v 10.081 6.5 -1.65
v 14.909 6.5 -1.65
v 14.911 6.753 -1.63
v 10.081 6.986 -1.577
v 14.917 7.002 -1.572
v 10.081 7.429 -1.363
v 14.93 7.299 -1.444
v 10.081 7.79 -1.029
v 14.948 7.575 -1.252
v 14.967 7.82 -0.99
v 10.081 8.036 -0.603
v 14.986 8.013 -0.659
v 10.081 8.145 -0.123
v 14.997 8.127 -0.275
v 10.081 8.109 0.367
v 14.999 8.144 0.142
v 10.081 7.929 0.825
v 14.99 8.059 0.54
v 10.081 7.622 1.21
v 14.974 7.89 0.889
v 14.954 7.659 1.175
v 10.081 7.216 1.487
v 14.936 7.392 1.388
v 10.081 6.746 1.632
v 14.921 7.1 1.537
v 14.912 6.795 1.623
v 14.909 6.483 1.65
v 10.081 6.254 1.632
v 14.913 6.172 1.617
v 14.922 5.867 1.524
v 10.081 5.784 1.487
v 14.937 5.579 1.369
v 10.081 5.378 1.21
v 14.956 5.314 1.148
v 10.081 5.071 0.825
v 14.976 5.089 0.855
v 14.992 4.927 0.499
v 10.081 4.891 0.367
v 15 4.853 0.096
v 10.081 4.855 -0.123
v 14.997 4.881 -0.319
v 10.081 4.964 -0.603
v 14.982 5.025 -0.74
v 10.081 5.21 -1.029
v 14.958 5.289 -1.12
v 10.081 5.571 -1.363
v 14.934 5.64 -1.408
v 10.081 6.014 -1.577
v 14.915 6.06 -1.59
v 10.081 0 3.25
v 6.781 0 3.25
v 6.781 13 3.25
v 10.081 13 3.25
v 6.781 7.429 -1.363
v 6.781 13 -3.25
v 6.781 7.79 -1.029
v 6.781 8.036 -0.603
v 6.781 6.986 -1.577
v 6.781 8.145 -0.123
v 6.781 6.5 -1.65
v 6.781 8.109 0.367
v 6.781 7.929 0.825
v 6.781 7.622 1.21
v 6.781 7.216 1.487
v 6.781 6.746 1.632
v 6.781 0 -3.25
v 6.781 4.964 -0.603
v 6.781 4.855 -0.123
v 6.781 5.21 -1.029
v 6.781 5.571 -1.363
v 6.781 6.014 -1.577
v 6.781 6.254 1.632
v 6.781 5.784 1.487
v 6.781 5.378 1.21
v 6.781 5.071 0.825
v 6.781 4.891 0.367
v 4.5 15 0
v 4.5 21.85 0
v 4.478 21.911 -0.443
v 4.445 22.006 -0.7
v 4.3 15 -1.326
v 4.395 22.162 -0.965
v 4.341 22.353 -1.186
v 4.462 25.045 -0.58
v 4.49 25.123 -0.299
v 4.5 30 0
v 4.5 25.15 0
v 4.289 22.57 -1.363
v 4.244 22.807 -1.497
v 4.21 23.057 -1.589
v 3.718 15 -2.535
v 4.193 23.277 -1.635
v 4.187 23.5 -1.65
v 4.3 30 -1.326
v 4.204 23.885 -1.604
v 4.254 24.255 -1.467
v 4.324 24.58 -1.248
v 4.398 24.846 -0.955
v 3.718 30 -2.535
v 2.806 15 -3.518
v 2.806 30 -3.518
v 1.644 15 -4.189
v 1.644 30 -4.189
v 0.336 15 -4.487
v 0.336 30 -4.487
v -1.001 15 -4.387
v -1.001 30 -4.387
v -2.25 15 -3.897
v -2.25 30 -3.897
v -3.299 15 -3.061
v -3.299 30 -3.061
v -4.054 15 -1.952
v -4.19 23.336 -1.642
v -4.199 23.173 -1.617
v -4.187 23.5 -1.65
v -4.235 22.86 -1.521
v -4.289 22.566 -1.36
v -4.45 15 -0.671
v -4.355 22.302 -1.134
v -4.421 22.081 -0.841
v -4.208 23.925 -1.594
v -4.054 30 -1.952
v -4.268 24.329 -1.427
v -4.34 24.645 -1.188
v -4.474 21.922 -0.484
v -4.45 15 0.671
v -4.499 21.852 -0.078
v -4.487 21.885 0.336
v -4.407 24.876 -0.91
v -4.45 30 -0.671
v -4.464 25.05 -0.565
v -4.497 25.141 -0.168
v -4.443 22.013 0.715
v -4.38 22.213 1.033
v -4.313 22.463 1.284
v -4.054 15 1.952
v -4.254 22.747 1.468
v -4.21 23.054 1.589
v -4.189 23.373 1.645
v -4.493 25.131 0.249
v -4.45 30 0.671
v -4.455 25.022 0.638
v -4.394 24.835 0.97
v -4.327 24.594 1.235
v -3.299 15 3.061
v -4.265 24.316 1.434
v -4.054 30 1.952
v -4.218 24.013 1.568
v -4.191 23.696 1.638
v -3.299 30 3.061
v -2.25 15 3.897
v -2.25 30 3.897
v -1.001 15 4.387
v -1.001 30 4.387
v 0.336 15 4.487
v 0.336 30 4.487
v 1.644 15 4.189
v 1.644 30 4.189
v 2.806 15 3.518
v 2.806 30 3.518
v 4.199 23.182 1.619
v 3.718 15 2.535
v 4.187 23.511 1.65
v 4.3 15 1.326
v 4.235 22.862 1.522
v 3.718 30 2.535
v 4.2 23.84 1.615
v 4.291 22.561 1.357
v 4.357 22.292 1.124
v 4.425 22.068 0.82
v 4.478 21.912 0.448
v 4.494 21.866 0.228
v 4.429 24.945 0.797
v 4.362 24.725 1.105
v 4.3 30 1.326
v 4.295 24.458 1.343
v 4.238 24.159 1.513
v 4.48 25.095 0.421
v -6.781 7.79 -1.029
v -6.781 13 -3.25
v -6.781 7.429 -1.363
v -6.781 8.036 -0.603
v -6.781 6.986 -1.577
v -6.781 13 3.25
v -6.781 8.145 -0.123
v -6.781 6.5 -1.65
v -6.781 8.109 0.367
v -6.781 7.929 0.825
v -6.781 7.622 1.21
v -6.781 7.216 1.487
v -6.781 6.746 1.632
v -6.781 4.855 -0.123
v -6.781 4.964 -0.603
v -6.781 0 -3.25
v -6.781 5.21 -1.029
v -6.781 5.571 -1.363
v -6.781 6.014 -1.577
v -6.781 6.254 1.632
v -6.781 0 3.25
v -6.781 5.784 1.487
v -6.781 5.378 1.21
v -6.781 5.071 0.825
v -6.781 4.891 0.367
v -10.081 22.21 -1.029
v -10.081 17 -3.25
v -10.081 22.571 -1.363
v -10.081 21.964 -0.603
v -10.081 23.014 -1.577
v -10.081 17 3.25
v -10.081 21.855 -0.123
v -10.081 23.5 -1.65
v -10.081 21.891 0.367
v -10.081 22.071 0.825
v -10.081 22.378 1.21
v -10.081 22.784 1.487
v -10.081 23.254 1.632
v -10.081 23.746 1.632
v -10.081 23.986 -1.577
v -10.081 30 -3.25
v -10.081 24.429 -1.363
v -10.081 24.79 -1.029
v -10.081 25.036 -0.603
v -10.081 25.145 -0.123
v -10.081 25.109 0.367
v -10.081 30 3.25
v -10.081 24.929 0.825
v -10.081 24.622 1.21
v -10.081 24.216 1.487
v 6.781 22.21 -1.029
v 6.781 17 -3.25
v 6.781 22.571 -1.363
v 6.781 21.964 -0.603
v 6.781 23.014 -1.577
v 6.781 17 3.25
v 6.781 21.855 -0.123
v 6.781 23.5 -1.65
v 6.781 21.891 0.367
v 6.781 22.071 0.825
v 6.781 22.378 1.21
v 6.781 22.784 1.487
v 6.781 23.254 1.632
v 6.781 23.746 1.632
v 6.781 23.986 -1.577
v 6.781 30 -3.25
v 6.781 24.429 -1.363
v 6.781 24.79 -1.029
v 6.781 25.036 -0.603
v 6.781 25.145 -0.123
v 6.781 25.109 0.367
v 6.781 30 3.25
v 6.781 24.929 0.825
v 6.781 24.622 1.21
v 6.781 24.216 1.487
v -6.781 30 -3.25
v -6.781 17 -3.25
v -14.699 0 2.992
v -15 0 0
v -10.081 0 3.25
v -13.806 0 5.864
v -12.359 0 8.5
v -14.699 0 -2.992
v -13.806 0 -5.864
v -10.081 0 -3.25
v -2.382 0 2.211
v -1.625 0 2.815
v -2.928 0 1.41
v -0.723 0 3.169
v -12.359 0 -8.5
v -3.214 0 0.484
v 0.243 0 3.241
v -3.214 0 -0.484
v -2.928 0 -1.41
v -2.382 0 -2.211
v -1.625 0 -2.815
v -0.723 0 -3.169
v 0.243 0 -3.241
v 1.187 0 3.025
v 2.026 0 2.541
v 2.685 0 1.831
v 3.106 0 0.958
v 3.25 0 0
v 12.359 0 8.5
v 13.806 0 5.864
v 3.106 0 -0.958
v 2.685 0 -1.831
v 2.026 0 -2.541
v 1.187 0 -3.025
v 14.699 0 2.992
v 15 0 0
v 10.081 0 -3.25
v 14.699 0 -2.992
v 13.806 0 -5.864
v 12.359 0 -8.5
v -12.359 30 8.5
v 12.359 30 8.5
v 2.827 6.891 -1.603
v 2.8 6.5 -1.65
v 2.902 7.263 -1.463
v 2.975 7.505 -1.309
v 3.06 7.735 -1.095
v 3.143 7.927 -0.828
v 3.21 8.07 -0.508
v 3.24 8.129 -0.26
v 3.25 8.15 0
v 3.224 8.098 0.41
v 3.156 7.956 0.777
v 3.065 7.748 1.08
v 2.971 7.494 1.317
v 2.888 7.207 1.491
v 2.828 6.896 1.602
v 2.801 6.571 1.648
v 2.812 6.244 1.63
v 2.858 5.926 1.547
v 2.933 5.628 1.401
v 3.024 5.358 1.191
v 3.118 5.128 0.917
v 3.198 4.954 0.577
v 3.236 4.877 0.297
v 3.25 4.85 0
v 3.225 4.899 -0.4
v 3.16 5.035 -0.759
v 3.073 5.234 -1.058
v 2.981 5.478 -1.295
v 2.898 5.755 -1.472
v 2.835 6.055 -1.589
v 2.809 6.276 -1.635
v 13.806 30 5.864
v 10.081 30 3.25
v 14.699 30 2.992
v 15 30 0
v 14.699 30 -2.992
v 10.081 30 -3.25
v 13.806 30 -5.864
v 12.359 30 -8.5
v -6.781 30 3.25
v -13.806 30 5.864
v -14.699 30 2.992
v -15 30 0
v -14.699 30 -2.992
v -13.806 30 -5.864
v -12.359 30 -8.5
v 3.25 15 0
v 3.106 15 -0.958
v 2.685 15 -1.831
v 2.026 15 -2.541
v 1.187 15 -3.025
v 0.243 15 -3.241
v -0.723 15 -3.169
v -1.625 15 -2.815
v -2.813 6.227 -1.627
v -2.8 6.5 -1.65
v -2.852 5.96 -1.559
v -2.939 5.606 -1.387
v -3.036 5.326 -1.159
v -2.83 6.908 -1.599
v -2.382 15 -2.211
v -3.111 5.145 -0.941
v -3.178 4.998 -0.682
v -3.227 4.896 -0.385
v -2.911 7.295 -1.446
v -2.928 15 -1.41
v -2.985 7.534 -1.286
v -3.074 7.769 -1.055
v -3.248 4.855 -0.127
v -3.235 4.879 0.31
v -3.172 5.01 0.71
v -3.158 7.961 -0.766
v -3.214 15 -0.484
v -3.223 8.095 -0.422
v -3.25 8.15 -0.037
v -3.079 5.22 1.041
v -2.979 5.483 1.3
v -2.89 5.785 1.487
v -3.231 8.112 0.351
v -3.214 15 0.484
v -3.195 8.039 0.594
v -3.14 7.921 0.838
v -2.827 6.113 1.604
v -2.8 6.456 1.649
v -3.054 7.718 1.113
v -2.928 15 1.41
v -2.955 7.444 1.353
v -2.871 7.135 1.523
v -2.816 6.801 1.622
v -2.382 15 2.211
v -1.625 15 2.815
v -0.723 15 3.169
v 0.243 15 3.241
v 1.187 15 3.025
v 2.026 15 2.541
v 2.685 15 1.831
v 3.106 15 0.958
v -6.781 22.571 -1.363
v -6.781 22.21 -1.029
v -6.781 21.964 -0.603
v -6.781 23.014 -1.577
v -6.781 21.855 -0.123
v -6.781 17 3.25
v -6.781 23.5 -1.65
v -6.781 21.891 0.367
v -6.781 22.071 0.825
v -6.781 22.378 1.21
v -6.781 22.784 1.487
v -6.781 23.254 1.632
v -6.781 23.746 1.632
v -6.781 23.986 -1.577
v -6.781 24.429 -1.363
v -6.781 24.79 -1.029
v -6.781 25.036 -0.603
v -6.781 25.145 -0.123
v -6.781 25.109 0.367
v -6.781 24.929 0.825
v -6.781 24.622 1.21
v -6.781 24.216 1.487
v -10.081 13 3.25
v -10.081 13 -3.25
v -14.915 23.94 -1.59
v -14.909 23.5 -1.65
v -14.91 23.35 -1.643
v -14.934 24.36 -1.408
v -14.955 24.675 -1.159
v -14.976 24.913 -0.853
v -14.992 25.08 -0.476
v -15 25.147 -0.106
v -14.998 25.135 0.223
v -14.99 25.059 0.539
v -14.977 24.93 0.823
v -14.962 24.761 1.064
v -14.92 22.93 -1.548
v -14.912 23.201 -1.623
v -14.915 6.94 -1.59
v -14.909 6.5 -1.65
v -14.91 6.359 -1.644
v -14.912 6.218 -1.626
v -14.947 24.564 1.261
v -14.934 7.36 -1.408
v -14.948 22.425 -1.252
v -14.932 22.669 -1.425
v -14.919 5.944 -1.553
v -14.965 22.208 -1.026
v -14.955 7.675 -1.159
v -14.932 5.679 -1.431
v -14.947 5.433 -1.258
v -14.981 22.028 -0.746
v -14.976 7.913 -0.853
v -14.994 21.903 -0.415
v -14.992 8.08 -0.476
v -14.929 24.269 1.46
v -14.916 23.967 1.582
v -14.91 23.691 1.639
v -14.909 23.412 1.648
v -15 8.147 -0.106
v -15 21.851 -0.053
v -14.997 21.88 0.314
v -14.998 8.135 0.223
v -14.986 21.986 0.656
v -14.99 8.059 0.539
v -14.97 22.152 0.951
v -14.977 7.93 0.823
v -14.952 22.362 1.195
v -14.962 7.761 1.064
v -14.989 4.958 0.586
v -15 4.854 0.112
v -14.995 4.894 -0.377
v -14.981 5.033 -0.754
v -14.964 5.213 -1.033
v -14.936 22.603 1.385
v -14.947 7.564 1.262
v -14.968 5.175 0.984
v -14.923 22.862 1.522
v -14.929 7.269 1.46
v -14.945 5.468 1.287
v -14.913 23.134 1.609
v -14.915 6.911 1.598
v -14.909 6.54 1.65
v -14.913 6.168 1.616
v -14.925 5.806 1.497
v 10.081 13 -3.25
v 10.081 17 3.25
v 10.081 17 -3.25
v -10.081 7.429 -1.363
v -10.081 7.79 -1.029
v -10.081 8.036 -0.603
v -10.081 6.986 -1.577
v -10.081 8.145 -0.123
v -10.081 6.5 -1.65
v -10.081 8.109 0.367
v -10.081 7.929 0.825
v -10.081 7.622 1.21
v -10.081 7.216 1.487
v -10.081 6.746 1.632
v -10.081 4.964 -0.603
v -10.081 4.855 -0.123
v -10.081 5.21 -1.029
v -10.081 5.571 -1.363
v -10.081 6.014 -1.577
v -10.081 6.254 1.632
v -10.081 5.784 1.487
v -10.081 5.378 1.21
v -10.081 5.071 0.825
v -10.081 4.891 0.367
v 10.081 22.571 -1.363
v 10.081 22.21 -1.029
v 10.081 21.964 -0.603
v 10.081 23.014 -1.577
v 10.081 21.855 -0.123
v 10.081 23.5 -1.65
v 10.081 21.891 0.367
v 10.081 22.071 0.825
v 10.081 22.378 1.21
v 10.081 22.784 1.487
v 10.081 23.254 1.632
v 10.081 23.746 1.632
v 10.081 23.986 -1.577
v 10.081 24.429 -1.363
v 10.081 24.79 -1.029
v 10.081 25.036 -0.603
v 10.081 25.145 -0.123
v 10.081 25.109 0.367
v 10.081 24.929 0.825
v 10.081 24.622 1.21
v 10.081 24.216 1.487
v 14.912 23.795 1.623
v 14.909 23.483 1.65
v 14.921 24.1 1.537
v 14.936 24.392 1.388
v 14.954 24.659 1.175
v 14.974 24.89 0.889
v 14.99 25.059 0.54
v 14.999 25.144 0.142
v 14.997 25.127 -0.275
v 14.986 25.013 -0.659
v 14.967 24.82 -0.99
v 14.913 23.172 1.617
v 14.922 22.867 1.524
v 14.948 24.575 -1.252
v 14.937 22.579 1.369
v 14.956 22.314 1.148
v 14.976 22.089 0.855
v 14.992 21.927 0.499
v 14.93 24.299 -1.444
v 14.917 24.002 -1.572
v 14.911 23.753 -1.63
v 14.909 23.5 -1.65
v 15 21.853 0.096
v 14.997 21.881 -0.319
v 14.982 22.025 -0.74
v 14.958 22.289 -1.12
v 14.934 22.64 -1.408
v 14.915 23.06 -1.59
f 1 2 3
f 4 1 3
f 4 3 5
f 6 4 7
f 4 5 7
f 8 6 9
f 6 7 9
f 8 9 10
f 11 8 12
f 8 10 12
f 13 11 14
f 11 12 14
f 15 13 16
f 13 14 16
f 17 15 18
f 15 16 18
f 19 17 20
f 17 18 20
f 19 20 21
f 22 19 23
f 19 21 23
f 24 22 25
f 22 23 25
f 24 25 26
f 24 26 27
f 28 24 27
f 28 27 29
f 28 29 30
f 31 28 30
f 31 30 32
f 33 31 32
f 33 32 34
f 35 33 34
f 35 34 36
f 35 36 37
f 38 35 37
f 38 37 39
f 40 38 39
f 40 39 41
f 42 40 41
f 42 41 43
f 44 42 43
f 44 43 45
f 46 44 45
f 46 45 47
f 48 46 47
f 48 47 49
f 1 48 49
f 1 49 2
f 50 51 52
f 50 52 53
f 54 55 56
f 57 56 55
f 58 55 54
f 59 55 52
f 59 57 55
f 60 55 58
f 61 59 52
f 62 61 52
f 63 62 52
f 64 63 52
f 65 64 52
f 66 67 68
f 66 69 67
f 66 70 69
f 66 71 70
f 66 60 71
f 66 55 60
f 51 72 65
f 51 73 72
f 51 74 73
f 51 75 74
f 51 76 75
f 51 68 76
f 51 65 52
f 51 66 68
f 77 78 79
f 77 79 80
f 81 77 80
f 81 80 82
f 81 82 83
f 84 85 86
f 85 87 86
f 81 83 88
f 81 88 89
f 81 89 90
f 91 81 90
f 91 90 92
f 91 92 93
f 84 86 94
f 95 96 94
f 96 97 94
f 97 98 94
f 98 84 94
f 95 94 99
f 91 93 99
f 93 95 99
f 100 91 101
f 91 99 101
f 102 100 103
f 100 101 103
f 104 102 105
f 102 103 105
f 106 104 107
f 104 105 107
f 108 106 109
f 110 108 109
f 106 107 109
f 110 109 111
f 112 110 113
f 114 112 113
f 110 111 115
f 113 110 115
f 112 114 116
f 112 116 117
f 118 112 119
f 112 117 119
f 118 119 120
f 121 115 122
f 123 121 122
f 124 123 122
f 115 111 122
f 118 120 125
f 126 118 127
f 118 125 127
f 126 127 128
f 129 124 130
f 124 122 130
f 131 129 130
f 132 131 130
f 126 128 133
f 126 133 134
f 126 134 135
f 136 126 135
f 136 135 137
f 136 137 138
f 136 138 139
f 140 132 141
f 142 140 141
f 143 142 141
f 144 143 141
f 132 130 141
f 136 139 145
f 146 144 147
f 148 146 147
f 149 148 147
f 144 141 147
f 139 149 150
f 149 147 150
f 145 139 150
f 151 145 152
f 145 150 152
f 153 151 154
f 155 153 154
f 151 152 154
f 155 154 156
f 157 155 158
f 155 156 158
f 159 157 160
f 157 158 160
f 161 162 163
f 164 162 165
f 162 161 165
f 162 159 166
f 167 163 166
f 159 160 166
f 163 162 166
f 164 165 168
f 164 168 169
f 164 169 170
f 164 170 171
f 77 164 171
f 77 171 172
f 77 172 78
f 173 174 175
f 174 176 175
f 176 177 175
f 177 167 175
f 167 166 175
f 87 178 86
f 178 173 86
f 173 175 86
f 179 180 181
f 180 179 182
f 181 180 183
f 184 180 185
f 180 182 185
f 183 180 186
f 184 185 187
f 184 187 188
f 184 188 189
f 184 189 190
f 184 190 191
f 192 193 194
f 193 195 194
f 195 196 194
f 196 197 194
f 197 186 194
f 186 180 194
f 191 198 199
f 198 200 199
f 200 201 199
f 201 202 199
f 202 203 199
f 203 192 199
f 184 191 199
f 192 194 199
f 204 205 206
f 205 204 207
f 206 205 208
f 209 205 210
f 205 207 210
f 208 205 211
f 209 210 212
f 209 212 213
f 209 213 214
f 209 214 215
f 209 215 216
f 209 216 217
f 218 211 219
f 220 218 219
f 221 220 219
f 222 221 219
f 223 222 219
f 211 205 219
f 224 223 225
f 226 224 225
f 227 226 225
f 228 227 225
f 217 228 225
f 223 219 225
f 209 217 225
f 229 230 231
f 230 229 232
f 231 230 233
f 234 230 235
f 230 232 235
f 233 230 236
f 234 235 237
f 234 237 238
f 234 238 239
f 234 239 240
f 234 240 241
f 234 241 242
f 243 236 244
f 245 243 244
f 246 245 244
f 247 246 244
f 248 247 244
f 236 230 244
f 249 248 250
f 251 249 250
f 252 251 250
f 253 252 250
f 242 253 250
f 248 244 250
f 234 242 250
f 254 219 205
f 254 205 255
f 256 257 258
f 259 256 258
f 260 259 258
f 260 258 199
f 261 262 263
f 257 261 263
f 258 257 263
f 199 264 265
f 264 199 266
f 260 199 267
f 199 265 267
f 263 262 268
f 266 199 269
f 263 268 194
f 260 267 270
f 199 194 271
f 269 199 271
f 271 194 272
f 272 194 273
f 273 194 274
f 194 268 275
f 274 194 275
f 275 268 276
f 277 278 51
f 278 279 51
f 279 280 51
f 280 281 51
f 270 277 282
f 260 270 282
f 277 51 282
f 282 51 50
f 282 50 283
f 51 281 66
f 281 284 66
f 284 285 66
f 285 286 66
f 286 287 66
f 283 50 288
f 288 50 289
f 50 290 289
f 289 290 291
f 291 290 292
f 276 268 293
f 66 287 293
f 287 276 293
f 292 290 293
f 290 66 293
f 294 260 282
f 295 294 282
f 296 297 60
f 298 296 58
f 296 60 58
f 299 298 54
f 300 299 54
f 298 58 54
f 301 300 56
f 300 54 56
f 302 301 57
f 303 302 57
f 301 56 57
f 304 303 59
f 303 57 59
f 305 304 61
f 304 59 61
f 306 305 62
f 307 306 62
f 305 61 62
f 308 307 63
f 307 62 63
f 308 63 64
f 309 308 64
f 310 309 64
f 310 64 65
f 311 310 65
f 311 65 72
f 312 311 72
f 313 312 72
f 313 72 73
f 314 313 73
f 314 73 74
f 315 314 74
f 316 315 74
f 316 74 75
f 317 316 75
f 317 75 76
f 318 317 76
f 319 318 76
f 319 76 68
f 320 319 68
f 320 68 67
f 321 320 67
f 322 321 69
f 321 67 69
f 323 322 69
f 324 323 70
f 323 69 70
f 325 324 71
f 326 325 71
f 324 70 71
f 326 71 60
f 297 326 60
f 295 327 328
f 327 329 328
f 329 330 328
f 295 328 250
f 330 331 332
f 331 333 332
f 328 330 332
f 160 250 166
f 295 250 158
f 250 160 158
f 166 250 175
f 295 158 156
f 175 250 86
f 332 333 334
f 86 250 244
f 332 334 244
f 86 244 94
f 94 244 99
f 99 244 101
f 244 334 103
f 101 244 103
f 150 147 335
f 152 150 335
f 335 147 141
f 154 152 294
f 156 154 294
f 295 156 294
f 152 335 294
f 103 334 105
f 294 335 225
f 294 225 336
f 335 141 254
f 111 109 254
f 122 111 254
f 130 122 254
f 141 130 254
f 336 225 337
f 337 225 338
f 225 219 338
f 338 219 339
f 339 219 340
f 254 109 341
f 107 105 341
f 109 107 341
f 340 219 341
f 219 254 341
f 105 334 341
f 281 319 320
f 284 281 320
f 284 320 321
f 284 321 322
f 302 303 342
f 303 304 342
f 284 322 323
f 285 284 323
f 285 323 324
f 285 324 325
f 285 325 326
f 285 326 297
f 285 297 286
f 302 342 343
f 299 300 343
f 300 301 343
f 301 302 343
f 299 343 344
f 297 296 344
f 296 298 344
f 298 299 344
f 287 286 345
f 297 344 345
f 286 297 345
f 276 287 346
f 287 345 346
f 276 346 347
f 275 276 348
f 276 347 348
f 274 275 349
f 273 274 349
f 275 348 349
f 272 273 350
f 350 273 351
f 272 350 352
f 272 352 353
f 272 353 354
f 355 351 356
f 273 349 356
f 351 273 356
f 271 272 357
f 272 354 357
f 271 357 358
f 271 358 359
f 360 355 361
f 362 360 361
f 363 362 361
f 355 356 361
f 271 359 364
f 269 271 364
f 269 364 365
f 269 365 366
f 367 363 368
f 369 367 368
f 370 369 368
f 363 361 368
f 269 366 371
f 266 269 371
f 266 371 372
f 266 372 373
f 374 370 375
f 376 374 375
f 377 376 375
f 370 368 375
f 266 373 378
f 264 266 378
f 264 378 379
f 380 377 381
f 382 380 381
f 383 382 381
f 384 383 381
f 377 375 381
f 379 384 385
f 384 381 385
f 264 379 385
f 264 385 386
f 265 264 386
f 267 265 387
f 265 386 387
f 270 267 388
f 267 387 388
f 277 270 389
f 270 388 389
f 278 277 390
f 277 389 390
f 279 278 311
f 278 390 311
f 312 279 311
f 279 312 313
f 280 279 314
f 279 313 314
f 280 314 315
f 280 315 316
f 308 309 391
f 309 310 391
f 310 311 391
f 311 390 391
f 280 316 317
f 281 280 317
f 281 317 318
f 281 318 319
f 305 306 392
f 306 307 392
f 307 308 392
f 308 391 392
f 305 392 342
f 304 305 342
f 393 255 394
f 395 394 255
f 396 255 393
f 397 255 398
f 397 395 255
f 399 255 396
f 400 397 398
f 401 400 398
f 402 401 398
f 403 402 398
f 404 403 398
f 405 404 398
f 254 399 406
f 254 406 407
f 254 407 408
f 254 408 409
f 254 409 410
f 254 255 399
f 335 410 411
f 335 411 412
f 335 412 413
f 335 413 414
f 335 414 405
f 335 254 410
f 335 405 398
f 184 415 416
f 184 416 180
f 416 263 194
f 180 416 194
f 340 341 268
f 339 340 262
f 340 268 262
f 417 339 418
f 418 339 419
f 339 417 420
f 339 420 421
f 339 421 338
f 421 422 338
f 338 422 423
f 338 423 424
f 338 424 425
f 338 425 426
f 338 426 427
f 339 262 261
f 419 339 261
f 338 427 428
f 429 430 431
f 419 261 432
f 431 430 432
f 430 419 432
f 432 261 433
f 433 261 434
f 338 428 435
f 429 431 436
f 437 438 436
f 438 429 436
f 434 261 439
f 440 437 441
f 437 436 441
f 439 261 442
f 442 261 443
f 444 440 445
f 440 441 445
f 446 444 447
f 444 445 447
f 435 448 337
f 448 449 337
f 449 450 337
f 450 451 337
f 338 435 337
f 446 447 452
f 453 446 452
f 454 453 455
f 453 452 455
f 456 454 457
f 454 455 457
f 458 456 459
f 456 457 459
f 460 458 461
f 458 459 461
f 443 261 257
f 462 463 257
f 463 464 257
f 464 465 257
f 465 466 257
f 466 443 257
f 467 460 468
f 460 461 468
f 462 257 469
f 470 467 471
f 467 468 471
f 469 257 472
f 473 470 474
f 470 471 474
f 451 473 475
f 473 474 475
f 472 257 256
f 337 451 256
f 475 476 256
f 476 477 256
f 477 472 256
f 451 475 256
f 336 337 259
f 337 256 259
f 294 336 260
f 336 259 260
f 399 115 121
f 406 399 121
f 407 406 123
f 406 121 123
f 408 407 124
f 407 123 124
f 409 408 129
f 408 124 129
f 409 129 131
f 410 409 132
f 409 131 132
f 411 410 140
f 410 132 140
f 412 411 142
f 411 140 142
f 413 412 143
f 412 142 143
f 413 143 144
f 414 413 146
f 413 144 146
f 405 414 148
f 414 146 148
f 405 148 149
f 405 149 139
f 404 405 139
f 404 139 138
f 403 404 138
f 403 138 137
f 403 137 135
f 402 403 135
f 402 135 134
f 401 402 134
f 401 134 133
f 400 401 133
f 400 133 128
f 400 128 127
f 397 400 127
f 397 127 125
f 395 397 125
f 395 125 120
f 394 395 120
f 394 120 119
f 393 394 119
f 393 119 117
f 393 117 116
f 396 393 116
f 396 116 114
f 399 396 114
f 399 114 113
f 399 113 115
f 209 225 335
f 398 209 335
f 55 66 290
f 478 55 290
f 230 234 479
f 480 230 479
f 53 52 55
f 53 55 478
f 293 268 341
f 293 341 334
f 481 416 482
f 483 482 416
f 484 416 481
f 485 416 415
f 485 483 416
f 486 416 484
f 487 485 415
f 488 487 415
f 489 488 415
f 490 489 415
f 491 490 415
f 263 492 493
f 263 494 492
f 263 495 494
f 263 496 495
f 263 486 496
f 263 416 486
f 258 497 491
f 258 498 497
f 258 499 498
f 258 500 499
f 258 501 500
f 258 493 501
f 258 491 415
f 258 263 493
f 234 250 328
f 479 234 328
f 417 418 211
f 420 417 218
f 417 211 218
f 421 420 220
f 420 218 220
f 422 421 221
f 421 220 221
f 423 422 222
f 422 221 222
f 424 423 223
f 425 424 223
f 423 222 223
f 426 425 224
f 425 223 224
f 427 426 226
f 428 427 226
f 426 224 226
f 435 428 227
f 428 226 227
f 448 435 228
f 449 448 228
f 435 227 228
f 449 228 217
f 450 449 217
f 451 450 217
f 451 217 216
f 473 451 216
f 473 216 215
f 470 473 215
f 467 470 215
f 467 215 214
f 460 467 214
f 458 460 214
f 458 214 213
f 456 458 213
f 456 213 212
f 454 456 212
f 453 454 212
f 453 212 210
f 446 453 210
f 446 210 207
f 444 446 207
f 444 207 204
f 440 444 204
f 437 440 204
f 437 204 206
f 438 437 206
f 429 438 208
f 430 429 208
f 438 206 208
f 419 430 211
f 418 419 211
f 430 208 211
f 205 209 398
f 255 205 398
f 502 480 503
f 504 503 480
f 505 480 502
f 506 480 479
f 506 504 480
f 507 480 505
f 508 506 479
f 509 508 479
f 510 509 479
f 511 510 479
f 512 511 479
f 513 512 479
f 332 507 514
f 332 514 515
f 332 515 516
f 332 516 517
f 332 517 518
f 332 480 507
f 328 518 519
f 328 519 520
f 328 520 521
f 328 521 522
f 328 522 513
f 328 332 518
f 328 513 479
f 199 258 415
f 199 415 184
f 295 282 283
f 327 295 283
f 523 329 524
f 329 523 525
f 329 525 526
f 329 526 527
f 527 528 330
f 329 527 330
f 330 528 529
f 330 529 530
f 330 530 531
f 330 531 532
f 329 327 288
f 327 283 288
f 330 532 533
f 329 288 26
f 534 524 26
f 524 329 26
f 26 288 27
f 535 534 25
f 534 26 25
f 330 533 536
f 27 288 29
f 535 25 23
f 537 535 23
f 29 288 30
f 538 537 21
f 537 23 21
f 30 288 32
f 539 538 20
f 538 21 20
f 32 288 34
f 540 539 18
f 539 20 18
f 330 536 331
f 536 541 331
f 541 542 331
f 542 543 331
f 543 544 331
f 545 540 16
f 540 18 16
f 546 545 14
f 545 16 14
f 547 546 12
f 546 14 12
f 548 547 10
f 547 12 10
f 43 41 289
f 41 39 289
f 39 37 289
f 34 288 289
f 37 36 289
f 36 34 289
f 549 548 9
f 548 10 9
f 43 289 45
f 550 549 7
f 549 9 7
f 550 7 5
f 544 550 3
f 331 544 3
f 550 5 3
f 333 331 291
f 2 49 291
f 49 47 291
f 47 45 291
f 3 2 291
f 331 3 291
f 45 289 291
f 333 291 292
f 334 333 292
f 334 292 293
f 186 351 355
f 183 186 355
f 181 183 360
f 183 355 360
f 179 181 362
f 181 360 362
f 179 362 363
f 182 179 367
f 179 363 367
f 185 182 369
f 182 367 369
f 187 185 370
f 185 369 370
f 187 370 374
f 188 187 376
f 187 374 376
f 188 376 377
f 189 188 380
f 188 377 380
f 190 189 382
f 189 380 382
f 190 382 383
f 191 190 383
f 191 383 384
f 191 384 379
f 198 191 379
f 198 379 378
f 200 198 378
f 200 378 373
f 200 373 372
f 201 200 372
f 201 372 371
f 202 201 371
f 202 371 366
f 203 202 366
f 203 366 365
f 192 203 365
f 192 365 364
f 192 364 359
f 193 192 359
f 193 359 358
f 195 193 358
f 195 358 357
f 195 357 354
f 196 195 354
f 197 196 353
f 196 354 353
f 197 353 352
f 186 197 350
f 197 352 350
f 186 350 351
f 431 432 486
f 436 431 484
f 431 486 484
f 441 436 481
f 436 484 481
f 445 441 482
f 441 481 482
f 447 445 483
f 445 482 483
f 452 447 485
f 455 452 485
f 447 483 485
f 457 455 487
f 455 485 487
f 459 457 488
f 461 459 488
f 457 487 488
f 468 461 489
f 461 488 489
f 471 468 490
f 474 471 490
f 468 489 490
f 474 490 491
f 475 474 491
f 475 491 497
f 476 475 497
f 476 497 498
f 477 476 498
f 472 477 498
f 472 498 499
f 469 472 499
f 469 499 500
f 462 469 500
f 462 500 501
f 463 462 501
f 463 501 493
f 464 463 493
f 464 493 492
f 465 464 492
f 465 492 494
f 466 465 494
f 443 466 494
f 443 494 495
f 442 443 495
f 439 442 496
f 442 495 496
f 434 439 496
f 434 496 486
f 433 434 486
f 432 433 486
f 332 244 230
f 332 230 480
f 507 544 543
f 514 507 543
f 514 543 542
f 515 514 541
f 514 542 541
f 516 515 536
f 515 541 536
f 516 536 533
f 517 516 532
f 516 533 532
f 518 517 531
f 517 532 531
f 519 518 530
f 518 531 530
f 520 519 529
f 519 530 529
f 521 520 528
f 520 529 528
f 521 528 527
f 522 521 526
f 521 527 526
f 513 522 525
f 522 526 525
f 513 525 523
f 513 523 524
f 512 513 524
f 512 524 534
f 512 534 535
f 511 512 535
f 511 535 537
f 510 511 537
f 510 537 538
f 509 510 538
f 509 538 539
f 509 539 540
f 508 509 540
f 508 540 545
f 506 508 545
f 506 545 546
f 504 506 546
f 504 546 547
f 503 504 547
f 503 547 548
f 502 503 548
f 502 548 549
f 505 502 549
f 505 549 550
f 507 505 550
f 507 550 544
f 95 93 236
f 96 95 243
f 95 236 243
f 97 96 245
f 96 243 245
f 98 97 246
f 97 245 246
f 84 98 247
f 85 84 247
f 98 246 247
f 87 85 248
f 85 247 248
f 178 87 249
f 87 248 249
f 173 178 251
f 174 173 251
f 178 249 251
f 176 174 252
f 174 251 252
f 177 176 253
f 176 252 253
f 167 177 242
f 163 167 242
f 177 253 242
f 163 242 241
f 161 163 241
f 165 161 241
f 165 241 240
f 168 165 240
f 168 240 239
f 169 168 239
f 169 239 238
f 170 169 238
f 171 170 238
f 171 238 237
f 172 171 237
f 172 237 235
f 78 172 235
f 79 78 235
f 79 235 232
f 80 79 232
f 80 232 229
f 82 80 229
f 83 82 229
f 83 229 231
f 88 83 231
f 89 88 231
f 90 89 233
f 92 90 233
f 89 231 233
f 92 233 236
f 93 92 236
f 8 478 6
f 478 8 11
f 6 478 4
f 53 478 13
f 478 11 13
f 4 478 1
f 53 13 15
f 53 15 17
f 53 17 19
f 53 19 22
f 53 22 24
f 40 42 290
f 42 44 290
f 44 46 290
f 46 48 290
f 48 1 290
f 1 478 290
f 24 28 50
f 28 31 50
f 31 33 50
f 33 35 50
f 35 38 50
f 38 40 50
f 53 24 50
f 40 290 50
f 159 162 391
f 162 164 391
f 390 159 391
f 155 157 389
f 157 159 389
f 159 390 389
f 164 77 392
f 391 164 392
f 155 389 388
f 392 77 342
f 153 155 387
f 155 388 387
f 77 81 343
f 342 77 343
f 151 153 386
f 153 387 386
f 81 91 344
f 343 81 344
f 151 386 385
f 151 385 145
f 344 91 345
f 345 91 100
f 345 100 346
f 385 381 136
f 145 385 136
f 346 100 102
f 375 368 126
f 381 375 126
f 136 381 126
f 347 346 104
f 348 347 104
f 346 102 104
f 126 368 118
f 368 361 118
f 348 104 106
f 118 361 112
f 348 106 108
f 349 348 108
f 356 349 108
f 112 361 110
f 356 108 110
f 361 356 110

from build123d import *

# Parameters (mm, degrees)
ESBO_O2_W                  = 3.3
ESBO_O2_H                  = 6.5
CORTE_EXTRUS_O1_DEPTH      = 13
CORTE_EXTRUS_O2_START      = -30
ESBO_O2_2_W                = 3.3
ESBO_O2_2_H                = 6.5
CORTE_EXTRUS_O2_DEPTH      = 13
CORTE_EXTRUS_O4_START      = 15
ESBO_O3_R                  = 1.65
CORTE_EXTRUS_O4_DEPTH      = 37.780782806
ESBO_O4_W                  = 59.68713318
ESBO_O4_H                  = 37
ESBO_O4_W_2                = 39.68713318
ESBO_O4_H_2                = 17
CORTE_EXTRUS_O_FINA1_DEPTH = 33


with BuildPart() as part:
    # Esboço1 → Revolução1 (revolve)
    with BuildSketch(Plane.XY):
        Polygon((4.5, 30), (15, 30), (15, 0), (3.25, 0), (3.25, 15), (4.5, 15), align=None)
    revolve(axis=Axis((0, 0, 0), (0, 1, 0)))

    # Esboço2 → Corte-extrusão1 (cut)
    with BuildSketch(Plane.XZ):
        with Locations((8.430782806, 0)):
            Rectangle(ESBO_O2_W, ESBO_O2_H)
        with Locations((-8.430782806, 0)):
            Rectangle(ESBO_O2_W, ESBO_O2_H)
    extrude(amount=-CORTE_EXTRUS_O1_DEPTH, mode=Mode.SUBTRACT)

    # Esboço2<2> → Corte-extrusão2 (cut)
    with BuildSketch(Plane.XZ.offset(CORTE_EXTRUS_O2_START)):
        with Locations((8.430782806, 0)):
            Rectangle(ESBO_O2_2_W, ESBO_O2_2_H)
        with Locations((-8.430782806, 0)):
            Rectangle(ESBO_O2_2_W, ESBO_O2_2_H)
    extrude(amount=CORTE_EXTRUS_O2_DEPTH, mode=Mode.SUBTRACT)

    # Esboço3 → Corte-extrusão4 (cut, through all)
    with BuildSketch(Plane(origin=(6.780782806, 0, 0), x_dir=(0, 0, -1), z_dir=(1, 0, 0)).offset(CORTE_EXTRUS_O4_START)):
        with Locations((0, 23.5)):
            Circle(ESBO_O3_R)
        with Locations((0, 6.5)):
            Circle(ESBO_O3_R)
    extrude(amount=-CORTE_EXTRUS_O4_DEPTH, mode=Mode.SUBTRACT)

    # Esboço4 → Corte-Extrusão-Fina1 (cut)
    with BuildSketch(Plane.XZ):
        Rectangle(ESBO_O4_W, ESBO_O4_H)
        Rectangle(ESBO_O4_W_2, ESBO_O4_H_2, mode=Mode.SUBTRACT)
    extrude(amount=-CORTE_EXTRUS_O_FINA1_DEPTH, mode=Mode.SUBTRACT)


solid = part.part
